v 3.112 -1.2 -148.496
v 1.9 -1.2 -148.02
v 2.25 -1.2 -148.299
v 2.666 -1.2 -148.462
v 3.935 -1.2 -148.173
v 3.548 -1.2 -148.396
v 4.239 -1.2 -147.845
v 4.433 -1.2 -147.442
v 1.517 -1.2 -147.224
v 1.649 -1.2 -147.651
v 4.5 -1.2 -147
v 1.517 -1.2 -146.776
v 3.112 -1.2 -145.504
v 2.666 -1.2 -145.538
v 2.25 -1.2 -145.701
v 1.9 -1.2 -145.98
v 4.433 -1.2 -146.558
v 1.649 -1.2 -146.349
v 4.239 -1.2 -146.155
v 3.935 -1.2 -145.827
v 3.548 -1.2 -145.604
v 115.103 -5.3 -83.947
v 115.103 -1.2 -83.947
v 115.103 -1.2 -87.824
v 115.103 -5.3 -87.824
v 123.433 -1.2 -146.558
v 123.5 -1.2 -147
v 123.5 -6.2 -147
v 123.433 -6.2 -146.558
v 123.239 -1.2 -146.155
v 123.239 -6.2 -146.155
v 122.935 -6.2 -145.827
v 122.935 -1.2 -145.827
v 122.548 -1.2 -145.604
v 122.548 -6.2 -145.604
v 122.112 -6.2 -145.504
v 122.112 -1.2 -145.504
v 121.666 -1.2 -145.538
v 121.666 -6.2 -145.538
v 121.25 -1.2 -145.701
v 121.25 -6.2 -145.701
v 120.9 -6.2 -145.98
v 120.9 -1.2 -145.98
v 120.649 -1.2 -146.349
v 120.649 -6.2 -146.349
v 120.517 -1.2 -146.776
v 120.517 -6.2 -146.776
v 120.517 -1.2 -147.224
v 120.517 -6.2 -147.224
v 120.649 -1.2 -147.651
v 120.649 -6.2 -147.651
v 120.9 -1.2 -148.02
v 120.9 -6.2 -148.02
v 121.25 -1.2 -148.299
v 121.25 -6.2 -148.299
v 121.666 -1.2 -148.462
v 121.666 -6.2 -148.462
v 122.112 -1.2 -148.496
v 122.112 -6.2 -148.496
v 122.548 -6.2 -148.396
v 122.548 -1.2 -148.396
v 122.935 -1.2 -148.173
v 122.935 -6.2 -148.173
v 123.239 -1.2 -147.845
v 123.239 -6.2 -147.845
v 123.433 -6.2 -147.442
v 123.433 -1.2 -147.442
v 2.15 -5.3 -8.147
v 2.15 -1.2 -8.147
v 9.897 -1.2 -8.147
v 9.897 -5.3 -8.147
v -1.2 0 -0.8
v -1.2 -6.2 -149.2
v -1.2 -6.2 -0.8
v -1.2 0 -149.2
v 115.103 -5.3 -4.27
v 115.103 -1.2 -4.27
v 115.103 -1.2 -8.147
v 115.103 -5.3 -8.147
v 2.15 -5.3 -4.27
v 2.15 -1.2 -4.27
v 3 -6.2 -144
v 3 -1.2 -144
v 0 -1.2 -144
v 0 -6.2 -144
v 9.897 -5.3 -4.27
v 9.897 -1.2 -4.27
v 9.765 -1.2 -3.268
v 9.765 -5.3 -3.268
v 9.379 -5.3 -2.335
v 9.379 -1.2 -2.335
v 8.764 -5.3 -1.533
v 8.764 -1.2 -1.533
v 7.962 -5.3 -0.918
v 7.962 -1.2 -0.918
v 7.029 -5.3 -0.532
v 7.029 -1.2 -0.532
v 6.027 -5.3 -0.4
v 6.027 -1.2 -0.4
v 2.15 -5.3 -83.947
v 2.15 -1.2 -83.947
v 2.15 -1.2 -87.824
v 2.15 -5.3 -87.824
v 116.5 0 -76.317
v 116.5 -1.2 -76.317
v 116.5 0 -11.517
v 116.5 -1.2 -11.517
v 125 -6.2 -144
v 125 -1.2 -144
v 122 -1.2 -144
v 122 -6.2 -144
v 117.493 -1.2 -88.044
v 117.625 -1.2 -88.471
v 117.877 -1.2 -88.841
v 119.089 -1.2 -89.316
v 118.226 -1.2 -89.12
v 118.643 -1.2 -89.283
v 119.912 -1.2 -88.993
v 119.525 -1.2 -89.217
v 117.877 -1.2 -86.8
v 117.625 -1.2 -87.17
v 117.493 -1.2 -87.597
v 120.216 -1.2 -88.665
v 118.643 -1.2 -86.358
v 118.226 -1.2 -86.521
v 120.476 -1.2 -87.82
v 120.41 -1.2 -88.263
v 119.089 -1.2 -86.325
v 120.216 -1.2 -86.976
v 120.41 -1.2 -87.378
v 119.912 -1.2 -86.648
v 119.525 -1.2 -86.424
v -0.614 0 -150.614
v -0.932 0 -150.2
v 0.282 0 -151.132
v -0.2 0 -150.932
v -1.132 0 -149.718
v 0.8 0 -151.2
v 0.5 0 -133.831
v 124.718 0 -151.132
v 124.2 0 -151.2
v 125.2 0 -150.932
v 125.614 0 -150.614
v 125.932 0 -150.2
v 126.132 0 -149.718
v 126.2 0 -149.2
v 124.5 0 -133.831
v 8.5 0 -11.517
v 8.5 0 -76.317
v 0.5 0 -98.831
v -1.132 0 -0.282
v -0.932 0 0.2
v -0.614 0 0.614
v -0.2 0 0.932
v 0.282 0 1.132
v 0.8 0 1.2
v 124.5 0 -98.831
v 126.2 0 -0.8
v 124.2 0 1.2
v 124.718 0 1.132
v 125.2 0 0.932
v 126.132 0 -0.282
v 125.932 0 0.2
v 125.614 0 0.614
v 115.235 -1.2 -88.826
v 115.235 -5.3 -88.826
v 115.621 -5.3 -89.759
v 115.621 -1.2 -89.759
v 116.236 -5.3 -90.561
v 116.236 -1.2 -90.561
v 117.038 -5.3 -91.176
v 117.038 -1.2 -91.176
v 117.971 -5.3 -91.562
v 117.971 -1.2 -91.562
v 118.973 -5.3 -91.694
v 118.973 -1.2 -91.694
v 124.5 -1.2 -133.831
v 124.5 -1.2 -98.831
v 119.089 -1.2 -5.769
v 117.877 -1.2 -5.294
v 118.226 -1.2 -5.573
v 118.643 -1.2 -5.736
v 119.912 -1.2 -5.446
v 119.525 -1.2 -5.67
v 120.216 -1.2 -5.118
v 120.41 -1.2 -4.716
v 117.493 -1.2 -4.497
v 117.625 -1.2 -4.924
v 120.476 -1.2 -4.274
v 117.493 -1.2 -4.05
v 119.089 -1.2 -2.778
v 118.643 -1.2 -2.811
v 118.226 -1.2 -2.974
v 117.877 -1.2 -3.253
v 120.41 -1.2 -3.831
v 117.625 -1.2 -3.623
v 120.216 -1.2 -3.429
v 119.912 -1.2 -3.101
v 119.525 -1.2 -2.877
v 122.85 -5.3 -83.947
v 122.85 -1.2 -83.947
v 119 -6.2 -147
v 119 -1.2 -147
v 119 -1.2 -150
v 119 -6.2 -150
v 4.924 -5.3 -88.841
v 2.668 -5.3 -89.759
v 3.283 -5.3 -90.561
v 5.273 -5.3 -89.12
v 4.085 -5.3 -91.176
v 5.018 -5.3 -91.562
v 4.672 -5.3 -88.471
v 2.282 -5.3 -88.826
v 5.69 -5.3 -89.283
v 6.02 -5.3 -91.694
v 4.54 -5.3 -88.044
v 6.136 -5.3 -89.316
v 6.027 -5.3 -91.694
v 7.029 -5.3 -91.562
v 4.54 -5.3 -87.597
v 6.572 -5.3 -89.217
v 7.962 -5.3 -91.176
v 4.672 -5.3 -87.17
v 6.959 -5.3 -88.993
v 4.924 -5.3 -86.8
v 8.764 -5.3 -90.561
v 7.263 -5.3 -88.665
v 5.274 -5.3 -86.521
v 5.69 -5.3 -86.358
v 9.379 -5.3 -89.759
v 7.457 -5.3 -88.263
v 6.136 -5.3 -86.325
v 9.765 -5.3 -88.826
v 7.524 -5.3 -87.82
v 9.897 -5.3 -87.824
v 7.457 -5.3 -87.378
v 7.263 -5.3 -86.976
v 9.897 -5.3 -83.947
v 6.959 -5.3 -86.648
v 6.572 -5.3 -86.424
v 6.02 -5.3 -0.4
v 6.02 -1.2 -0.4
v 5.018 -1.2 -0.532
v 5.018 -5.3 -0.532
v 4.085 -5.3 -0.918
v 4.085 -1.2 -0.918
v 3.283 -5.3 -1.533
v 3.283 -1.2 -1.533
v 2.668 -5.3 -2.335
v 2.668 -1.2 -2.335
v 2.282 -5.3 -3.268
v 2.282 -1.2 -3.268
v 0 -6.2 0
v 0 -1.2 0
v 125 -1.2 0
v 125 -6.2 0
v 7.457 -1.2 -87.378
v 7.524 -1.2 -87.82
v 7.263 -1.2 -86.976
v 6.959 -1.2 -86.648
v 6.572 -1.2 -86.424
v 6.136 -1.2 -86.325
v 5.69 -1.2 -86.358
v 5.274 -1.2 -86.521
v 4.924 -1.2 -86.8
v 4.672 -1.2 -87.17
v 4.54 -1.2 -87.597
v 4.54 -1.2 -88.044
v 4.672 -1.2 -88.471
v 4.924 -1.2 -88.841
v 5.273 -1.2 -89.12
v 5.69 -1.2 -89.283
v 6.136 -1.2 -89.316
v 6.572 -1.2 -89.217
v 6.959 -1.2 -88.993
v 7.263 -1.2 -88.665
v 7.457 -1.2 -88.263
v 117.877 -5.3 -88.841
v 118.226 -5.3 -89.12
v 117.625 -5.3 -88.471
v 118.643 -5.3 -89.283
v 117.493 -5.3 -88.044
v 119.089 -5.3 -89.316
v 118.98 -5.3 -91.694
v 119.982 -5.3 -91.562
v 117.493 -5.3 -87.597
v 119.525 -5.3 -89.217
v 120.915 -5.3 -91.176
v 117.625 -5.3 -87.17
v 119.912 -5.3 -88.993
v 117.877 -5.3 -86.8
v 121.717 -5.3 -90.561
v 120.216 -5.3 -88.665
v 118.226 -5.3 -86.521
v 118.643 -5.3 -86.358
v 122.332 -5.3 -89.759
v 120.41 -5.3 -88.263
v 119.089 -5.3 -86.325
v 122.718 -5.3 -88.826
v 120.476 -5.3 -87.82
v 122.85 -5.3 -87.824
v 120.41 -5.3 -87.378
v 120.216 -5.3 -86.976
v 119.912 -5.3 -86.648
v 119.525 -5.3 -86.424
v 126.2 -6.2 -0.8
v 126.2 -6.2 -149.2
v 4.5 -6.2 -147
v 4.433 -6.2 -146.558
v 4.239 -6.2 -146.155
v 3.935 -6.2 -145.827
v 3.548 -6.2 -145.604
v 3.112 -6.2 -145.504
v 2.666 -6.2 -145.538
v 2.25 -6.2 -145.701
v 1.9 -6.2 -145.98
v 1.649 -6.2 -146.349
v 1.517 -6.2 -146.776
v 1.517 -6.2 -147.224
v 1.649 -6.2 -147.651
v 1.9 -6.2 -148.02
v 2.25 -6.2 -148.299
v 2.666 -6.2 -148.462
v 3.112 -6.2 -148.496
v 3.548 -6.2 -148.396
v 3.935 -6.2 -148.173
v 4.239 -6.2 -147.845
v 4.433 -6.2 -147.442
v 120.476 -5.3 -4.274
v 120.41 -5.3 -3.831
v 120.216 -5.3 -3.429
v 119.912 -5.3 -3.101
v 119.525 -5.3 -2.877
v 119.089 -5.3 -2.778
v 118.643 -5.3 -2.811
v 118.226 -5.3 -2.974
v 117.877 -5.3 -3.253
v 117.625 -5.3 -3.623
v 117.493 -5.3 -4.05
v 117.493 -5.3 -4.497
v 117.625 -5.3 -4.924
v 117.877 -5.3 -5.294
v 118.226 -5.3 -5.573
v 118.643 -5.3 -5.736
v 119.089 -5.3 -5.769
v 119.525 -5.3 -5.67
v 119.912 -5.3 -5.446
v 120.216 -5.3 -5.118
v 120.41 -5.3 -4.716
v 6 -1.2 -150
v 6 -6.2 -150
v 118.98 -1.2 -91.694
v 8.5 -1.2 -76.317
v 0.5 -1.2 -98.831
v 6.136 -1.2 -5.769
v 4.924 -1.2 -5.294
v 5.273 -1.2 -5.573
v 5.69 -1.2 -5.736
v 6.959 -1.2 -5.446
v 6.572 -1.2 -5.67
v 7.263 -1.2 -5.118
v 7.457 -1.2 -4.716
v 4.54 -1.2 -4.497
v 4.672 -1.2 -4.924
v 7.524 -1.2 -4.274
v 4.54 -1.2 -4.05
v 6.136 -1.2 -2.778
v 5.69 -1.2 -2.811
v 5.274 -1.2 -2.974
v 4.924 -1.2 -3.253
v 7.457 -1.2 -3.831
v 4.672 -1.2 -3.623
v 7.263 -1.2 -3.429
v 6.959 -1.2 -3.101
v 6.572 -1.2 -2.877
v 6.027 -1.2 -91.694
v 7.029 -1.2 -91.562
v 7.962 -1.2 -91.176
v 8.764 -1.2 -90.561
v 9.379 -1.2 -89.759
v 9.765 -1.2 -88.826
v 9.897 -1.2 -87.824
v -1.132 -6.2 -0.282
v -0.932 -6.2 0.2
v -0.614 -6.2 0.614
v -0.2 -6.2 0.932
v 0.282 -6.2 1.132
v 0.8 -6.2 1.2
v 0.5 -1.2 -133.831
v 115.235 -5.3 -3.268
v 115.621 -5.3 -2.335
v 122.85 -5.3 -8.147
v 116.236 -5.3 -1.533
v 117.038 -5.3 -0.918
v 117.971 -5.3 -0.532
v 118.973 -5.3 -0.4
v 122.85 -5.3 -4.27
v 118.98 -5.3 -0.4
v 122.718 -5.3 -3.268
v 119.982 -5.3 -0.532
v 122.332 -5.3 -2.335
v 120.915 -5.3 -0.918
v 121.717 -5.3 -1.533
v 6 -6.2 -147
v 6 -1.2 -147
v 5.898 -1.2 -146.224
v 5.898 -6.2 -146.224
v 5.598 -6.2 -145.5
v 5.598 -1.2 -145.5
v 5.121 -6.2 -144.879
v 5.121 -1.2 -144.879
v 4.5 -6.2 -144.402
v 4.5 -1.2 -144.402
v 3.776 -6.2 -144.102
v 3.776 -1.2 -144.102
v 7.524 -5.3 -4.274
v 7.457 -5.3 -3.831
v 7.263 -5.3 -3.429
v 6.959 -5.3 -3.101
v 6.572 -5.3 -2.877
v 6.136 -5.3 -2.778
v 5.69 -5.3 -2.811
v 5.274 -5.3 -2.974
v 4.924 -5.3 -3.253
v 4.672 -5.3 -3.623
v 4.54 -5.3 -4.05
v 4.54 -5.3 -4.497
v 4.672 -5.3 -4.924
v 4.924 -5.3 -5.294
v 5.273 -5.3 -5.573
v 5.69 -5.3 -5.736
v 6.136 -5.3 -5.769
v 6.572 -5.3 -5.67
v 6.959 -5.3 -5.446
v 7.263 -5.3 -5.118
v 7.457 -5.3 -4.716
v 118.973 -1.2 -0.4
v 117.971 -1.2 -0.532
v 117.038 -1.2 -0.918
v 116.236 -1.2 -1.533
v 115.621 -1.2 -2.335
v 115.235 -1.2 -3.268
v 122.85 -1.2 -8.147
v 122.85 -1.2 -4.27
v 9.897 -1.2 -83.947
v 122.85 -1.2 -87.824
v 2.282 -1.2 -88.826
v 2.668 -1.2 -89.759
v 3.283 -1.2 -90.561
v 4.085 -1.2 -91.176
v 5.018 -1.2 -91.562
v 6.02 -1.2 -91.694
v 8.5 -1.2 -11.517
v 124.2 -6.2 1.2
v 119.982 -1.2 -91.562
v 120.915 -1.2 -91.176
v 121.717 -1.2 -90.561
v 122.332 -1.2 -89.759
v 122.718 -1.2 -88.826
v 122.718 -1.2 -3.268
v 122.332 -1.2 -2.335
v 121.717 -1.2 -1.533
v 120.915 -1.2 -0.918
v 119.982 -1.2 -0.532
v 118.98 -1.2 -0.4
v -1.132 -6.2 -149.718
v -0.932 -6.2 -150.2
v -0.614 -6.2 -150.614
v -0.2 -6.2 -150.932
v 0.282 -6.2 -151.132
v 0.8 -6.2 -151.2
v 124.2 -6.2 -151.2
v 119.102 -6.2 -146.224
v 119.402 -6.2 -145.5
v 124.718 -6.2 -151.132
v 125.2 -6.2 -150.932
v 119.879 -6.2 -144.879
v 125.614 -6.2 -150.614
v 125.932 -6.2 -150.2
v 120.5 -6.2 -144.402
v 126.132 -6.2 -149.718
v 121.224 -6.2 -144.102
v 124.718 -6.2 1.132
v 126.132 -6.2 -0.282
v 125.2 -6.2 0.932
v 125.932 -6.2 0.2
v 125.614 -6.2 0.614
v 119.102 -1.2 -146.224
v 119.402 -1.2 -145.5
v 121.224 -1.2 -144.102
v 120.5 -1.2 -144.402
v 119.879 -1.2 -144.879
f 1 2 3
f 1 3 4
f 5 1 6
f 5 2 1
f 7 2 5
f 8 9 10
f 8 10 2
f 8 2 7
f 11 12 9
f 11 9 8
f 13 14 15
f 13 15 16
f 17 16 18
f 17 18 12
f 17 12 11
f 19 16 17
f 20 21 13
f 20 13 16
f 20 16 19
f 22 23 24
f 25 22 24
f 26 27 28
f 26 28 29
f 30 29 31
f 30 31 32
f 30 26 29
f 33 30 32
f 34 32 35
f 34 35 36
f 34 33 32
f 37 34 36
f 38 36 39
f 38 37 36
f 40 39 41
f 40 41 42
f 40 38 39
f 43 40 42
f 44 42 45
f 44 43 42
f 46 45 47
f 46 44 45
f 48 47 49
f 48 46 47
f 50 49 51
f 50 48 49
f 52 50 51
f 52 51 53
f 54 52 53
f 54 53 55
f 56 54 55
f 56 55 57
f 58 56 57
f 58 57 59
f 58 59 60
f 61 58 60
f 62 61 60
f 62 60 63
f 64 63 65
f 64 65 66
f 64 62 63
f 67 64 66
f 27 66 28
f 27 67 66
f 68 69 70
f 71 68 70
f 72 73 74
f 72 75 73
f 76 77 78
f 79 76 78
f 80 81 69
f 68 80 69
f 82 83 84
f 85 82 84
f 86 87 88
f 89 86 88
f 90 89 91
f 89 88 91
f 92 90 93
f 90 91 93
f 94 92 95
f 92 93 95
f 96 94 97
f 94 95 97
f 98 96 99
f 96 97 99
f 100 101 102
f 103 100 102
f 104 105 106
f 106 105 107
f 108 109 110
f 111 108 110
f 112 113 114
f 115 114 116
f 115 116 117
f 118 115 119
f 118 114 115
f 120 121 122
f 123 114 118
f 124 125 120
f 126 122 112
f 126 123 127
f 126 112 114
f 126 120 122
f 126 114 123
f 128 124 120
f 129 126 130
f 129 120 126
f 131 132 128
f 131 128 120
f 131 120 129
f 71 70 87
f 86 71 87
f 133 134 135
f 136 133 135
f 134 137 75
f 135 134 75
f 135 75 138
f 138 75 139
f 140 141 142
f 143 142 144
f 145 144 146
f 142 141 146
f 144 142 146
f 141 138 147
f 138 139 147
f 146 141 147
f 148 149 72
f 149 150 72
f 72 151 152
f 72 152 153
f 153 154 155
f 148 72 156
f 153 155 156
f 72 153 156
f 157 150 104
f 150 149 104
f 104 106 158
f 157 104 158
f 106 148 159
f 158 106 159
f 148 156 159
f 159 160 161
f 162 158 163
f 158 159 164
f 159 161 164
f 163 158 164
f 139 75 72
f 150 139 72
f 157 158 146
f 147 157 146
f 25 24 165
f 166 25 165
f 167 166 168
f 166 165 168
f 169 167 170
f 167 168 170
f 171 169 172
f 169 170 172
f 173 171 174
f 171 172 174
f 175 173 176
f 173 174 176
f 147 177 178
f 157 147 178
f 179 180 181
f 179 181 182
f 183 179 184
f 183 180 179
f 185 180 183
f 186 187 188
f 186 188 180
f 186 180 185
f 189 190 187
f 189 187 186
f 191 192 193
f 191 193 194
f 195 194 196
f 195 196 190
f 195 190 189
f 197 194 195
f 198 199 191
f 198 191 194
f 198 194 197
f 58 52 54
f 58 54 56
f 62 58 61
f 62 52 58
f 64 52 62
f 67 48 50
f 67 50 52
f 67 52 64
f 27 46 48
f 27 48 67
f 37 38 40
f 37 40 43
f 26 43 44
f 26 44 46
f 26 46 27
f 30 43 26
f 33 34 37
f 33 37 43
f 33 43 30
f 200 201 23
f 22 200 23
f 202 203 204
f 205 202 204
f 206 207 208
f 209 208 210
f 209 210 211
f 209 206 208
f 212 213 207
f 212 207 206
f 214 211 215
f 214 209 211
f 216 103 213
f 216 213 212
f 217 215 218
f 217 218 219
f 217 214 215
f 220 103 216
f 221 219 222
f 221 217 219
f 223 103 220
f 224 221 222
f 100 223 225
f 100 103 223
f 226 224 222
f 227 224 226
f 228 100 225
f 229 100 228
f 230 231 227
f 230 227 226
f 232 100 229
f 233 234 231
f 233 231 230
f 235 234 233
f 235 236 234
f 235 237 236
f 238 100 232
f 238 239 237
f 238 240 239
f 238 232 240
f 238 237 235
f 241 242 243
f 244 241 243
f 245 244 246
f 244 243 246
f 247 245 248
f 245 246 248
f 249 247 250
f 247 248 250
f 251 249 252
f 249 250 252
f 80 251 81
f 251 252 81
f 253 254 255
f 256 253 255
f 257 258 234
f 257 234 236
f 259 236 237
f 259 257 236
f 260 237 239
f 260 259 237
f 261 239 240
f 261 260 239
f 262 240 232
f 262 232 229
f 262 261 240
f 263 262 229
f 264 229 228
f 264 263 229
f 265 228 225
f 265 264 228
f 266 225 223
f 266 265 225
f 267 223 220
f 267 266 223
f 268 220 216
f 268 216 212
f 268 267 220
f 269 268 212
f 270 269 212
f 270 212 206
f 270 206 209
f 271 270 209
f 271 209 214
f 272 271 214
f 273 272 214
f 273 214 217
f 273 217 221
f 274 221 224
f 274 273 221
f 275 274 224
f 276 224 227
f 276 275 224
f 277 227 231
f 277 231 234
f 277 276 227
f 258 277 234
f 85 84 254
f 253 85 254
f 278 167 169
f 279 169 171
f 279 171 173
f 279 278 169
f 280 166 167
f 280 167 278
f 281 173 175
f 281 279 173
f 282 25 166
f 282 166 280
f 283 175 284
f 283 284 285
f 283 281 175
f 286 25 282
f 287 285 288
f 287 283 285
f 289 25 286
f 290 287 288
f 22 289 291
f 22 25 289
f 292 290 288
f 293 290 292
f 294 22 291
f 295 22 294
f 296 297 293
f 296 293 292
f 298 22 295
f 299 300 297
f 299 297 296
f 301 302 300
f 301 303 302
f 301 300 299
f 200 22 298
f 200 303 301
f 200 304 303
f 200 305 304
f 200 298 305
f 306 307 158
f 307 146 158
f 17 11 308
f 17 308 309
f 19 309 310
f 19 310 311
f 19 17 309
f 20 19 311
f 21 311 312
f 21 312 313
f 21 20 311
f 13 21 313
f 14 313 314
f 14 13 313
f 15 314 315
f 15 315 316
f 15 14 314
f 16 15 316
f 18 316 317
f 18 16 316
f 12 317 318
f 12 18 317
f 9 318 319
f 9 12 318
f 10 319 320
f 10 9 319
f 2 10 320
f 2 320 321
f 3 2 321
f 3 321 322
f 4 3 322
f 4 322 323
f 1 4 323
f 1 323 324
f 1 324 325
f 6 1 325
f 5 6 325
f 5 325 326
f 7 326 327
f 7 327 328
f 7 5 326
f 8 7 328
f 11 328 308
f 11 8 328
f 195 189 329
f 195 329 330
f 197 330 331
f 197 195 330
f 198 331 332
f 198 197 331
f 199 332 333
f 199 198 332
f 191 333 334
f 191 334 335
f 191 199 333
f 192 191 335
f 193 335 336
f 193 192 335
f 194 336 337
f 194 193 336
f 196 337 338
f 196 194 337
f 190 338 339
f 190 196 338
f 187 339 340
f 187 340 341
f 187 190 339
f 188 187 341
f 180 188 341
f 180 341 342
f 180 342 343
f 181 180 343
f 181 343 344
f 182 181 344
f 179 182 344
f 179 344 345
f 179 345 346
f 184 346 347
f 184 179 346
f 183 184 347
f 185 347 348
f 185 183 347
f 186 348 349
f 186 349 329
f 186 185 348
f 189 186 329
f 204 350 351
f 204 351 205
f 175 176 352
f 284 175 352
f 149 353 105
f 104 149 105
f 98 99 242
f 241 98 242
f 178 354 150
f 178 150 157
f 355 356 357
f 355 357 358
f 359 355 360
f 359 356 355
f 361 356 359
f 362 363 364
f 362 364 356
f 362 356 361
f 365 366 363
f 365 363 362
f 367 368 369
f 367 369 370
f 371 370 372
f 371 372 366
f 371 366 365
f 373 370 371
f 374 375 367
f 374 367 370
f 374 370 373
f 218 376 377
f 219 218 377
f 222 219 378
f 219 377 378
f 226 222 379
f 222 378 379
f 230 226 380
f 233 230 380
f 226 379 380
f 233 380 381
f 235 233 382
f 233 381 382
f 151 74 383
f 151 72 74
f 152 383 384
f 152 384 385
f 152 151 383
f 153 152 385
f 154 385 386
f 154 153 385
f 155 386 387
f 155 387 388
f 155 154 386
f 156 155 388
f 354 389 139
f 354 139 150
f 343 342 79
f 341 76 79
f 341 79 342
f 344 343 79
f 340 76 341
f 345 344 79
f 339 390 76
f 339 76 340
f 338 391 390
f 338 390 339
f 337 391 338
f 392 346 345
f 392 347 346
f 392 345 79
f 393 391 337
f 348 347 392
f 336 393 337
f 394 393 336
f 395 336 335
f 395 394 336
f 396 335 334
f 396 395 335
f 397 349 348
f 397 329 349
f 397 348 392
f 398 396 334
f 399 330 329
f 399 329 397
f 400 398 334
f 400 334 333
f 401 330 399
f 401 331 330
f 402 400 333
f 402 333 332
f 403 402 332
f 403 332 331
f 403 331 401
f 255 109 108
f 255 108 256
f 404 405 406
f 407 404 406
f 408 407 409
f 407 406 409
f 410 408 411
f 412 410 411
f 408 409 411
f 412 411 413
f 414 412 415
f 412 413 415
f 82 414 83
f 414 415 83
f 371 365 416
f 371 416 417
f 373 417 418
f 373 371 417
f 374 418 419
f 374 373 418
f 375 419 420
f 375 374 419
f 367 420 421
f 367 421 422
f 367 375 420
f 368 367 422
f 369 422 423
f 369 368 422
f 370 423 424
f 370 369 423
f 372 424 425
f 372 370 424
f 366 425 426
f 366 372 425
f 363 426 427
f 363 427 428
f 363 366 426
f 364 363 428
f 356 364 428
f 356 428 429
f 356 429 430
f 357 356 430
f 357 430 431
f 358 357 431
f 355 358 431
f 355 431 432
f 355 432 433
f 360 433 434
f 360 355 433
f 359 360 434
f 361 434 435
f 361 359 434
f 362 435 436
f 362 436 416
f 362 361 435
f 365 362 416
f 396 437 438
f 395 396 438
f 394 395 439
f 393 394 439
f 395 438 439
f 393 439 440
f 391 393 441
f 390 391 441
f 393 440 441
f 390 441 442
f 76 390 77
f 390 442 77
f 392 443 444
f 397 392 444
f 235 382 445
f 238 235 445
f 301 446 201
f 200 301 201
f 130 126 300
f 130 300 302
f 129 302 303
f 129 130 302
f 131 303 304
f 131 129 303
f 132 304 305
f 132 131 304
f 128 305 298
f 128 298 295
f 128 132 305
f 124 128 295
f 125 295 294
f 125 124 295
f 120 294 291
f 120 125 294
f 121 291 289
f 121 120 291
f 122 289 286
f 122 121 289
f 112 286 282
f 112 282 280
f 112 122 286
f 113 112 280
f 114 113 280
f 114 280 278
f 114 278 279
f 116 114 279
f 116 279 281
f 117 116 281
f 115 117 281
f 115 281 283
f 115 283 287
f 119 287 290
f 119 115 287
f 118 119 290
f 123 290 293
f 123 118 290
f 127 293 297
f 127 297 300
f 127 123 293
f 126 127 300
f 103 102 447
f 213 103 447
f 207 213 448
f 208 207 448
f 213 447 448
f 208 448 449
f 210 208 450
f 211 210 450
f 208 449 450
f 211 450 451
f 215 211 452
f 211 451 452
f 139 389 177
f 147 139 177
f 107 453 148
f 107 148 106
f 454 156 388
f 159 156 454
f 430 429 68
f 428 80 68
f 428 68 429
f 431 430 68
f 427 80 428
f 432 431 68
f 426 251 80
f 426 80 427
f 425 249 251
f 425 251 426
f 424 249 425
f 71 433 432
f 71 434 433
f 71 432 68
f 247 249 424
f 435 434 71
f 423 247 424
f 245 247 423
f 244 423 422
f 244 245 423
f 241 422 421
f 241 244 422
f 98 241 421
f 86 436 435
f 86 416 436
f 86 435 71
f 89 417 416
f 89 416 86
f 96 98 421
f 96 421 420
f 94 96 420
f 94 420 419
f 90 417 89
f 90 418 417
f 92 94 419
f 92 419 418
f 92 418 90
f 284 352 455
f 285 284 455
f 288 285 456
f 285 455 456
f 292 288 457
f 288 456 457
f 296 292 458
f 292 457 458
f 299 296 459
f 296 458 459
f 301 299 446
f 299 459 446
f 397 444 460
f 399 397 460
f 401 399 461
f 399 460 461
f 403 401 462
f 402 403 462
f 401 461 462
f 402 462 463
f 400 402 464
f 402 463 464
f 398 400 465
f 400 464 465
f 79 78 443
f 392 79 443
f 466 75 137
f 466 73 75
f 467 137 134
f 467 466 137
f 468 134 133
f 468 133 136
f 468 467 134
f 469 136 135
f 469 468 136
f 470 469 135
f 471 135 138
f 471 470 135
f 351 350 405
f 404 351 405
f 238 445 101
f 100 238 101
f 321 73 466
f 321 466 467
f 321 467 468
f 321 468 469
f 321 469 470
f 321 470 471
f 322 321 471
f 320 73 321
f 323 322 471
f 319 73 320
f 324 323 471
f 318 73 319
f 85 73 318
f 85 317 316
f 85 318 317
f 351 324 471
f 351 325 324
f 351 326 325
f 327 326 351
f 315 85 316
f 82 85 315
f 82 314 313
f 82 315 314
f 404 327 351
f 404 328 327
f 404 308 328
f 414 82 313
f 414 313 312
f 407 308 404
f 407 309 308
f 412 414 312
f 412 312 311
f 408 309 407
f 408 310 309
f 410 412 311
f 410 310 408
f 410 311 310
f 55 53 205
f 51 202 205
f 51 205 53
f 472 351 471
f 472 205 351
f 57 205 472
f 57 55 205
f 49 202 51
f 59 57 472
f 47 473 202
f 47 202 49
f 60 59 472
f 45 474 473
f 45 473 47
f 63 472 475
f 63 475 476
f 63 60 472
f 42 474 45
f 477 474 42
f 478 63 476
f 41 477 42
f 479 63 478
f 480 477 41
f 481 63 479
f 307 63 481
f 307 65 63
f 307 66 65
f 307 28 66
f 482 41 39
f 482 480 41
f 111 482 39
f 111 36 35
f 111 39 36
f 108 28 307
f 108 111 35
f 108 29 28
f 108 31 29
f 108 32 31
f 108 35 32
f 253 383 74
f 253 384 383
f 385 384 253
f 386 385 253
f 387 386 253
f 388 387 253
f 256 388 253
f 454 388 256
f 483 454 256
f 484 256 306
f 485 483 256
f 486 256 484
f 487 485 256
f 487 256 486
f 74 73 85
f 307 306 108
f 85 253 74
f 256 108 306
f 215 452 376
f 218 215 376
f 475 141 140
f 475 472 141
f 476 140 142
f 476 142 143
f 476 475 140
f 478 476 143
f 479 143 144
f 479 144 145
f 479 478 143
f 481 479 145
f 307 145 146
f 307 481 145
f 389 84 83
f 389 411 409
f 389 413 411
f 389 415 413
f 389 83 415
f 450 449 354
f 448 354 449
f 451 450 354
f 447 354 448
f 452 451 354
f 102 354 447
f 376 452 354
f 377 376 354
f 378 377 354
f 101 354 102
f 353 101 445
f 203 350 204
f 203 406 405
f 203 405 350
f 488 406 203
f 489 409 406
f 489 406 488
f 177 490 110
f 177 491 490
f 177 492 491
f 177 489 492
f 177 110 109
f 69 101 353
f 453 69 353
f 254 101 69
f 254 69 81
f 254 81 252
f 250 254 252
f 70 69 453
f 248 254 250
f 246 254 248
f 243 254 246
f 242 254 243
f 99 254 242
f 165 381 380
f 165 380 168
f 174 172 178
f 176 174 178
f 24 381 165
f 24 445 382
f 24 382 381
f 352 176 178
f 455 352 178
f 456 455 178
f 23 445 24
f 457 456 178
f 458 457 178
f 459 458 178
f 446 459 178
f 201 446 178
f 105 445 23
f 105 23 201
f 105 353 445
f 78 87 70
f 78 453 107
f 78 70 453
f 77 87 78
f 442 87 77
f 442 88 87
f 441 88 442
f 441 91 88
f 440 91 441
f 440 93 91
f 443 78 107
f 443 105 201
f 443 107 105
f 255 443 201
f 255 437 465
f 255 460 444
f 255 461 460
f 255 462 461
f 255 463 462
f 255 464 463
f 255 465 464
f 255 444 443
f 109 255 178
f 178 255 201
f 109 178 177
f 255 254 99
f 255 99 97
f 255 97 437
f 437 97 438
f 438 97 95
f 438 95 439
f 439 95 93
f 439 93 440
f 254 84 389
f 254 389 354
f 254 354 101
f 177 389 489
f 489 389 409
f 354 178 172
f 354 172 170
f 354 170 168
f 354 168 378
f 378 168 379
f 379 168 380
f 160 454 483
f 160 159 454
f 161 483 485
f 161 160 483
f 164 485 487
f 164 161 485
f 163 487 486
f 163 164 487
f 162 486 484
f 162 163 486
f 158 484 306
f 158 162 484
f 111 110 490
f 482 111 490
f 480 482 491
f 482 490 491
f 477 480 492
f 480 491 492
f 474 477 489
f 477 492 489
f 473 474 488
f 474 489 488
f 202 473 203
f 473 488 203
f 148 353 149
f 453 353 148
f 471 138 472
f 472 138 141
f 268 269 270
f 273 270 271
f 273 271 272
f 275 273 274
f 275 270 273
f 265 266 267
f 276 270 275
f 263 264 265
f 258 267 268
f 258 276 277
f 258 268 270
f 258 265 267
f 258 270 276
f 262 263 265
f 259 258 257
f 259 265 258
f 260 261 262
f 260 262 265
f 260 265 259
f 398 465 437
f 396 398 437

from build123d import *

# Parameters (mm, degrees)
F0_W     = 127.4
F0_H     = 152.4
F0_W_2   = 125
F0_H_2   = 150
F1_DEPTH = 1.2
F2_DEPTH = 6.2
F3_W     = 108
F3_H     = 64.8
F4_DEPTH = 1.2
F3_R     = 1.5
F5_DEPTH = 4.1
F6_R     = 2
F3_W_2   = 124
F3_H_2   = 35
F7_DEPTH = 1.2
F8_DEPTH = 5


with BuildPart() as f1:
    # F0 (on Front) → F1 (new body)
    with BuildSketch(Plane.XZ):
        with Locations((62.5, -75)):
            Rectangle(F0_W, F0_H)
        with Locations((62.5, -75)):
            Rectangle(F0_W_2, F0_H_2, mode=Mode.SUBTRACT)
        with Locations((62.5, -75)):
            Rectangle(F0_W_2, F0_H_2)
    extrude(amount=F1_DEPTH)

    # F0 (on Front) → F2 (join)
    with BuildSketch(Plane.XZ):
        with Locations((62.5, -75)):
            Rectangle(F0_W, F0_H)
        with Locations((62.5, -75)):
            Rectangle(F0_W_2, F0_H_2, mode=Mode.SUBTRACT)
    extrude(amount=F2_DEPTH)

    # F3 (on face) → F4 (cut)
    with BuildSketch(Plane.XZ.offset(1.2)):
        with Locations((62.5, -43.917)):
            Rectangle(F3_W, F3_H)
    extrude(amount=-F4_DEPTH, mode=Mode.SUBTRACT)

    # F3 (on face) → F5 (join)
    with BuildSketch(Plane.XZ.offset(1.2)):
        with BuildLine():
            Line((2.15, -4.27), (2.15, -8.147))
            Line((2.15, -8.147), (9.897, -8.147))
            Line((9.897, -8.147), (9.897, -4.27))
            ThreePointArc((9.897, -4.27), (8.763503, -1.533497), (6.027, -0.4))
            Line((6.027, -0.4), (6.02, -0.4))
            ThreePointArc((6.02, -0.4), (3.283497, -1.533497), (2.15, -4.27))
        make_face()
        with Locations((6.0235, -4.2735)):
            Circle(F3_R, mode=Mode.SUBTRACT)
        with BuildLine():
            Line((115.103, -4.27), (115.103, -8.147))
            Line((115.103, -8.147), (122.85, -8.147))
            Line((122.85, -8.147), (122.85, -4.27))
            ThreePointArc((122.85, -4.27), (121.716503, -1.533497), (118.98, -0.4))
            Line((118.98, -0.4), (118.973, -0.4))
            ThreePointArc((118.973, -0.4), (116.236497, -1.533497), (115.103, -4.27))
        make_face()
        with Locations((118.9765, -4.2735)):
            Circle(F3_R, mode=Mode.SUBTRACT)
        with BuildLine():
            Line((122.85, -83.947), (115.103, -83.947))
            Line((115.103, -83.947), (115.103, -87.824))
            ThreePointArc((115.103, -87.824), (116.236497, -90.560503), (118.973, -91.694))
            Line((118.973, -91.694), (118.98, -91.694))
            ThreePointArc((118.98, -91.694), (121.716503, -90.560503), (122.85, -87.824))
            Line((122.85, -87.824), (122.85, -83.947))
        make_face()
        with Locations((118.9765, -87.8205)):
            Circle(F3_R, mode=Mode.SUBTRACT)
        with BuildLine():
            Line((9.897, -83.947), (2.15, -83.947))
            Line((2.15, -83.947), (2.15, -87.824))
            ThreePointArc((2.15, -87.824), (3.283497, -90.560503), (6.02, -91.694))
            Line((6.02, -91.694), (6.027, -91.694))
            ThreePointArc((6.027, -91.694), (8.763503, -90.560503), (9.897, -87.824))
            Line((9.897, -87.824), (9.897, -83.947))
        make_face()
        with Locations((6.0235, -87.8205)):
            Circle(F3_R, mode=Mode.SUBTRACT)
    extrude(amount=F5_DEPTH)

    # F6
    f6_edges = [f1.edges().sort_by_distance(p)[0] for p in [
        (126.2, -3.1, -151.2),
        (126.2, -3.1, 1.2),
        (-1.2, -3.1, 1.2),
        (-1.2, -3.1, -151.2),
    ]]
    fillet(f6_edges, radius=F6_R)

    # F3 (on face) → F7 (cut)
    with BuildSketch(Plane.XZ.offset(1.2)):
        with Locations((62.5, -116.33127)):
            Rectangle(F3_W_2, F3_H_2)
    extrude(amount=-F7_DEPTH, mode=Mode.SUBTRACT)

    # F3 (on face) → F8 (join)
    with BuildSketch(Plane.XZ.offset(1.2)):
        with BuildLine():
            Line((125, -150), (125, -144))
            Line((125, -144), (122, -144))
            ThreePointArc((122, -144), (119.87868, -144.87868), (119, -147))
            Line((119, -147), (119, -150))
            Line((119, -150), (125, -150))
        make_face()
        with Locations((122, -147)):
            Circle(F3_R, mode=Mode.SUBTRACT)
        with BuildLine():
            Line((0, -144), (0, -150))
            Line((0, -150), (6, -150))
            Line((6, -150), (6, -147))
            ThreePointArc((6, -147), (5.12132, -144.87868), (3, -144))
            Line((3, -144), (0, -144))
        make_face()
        with Locations((3, -147)):
            Circle(F3_R, mode=Mode.SUBTRACT)
    extrude(amount=F8_DEPTH)


solid = f1.part
